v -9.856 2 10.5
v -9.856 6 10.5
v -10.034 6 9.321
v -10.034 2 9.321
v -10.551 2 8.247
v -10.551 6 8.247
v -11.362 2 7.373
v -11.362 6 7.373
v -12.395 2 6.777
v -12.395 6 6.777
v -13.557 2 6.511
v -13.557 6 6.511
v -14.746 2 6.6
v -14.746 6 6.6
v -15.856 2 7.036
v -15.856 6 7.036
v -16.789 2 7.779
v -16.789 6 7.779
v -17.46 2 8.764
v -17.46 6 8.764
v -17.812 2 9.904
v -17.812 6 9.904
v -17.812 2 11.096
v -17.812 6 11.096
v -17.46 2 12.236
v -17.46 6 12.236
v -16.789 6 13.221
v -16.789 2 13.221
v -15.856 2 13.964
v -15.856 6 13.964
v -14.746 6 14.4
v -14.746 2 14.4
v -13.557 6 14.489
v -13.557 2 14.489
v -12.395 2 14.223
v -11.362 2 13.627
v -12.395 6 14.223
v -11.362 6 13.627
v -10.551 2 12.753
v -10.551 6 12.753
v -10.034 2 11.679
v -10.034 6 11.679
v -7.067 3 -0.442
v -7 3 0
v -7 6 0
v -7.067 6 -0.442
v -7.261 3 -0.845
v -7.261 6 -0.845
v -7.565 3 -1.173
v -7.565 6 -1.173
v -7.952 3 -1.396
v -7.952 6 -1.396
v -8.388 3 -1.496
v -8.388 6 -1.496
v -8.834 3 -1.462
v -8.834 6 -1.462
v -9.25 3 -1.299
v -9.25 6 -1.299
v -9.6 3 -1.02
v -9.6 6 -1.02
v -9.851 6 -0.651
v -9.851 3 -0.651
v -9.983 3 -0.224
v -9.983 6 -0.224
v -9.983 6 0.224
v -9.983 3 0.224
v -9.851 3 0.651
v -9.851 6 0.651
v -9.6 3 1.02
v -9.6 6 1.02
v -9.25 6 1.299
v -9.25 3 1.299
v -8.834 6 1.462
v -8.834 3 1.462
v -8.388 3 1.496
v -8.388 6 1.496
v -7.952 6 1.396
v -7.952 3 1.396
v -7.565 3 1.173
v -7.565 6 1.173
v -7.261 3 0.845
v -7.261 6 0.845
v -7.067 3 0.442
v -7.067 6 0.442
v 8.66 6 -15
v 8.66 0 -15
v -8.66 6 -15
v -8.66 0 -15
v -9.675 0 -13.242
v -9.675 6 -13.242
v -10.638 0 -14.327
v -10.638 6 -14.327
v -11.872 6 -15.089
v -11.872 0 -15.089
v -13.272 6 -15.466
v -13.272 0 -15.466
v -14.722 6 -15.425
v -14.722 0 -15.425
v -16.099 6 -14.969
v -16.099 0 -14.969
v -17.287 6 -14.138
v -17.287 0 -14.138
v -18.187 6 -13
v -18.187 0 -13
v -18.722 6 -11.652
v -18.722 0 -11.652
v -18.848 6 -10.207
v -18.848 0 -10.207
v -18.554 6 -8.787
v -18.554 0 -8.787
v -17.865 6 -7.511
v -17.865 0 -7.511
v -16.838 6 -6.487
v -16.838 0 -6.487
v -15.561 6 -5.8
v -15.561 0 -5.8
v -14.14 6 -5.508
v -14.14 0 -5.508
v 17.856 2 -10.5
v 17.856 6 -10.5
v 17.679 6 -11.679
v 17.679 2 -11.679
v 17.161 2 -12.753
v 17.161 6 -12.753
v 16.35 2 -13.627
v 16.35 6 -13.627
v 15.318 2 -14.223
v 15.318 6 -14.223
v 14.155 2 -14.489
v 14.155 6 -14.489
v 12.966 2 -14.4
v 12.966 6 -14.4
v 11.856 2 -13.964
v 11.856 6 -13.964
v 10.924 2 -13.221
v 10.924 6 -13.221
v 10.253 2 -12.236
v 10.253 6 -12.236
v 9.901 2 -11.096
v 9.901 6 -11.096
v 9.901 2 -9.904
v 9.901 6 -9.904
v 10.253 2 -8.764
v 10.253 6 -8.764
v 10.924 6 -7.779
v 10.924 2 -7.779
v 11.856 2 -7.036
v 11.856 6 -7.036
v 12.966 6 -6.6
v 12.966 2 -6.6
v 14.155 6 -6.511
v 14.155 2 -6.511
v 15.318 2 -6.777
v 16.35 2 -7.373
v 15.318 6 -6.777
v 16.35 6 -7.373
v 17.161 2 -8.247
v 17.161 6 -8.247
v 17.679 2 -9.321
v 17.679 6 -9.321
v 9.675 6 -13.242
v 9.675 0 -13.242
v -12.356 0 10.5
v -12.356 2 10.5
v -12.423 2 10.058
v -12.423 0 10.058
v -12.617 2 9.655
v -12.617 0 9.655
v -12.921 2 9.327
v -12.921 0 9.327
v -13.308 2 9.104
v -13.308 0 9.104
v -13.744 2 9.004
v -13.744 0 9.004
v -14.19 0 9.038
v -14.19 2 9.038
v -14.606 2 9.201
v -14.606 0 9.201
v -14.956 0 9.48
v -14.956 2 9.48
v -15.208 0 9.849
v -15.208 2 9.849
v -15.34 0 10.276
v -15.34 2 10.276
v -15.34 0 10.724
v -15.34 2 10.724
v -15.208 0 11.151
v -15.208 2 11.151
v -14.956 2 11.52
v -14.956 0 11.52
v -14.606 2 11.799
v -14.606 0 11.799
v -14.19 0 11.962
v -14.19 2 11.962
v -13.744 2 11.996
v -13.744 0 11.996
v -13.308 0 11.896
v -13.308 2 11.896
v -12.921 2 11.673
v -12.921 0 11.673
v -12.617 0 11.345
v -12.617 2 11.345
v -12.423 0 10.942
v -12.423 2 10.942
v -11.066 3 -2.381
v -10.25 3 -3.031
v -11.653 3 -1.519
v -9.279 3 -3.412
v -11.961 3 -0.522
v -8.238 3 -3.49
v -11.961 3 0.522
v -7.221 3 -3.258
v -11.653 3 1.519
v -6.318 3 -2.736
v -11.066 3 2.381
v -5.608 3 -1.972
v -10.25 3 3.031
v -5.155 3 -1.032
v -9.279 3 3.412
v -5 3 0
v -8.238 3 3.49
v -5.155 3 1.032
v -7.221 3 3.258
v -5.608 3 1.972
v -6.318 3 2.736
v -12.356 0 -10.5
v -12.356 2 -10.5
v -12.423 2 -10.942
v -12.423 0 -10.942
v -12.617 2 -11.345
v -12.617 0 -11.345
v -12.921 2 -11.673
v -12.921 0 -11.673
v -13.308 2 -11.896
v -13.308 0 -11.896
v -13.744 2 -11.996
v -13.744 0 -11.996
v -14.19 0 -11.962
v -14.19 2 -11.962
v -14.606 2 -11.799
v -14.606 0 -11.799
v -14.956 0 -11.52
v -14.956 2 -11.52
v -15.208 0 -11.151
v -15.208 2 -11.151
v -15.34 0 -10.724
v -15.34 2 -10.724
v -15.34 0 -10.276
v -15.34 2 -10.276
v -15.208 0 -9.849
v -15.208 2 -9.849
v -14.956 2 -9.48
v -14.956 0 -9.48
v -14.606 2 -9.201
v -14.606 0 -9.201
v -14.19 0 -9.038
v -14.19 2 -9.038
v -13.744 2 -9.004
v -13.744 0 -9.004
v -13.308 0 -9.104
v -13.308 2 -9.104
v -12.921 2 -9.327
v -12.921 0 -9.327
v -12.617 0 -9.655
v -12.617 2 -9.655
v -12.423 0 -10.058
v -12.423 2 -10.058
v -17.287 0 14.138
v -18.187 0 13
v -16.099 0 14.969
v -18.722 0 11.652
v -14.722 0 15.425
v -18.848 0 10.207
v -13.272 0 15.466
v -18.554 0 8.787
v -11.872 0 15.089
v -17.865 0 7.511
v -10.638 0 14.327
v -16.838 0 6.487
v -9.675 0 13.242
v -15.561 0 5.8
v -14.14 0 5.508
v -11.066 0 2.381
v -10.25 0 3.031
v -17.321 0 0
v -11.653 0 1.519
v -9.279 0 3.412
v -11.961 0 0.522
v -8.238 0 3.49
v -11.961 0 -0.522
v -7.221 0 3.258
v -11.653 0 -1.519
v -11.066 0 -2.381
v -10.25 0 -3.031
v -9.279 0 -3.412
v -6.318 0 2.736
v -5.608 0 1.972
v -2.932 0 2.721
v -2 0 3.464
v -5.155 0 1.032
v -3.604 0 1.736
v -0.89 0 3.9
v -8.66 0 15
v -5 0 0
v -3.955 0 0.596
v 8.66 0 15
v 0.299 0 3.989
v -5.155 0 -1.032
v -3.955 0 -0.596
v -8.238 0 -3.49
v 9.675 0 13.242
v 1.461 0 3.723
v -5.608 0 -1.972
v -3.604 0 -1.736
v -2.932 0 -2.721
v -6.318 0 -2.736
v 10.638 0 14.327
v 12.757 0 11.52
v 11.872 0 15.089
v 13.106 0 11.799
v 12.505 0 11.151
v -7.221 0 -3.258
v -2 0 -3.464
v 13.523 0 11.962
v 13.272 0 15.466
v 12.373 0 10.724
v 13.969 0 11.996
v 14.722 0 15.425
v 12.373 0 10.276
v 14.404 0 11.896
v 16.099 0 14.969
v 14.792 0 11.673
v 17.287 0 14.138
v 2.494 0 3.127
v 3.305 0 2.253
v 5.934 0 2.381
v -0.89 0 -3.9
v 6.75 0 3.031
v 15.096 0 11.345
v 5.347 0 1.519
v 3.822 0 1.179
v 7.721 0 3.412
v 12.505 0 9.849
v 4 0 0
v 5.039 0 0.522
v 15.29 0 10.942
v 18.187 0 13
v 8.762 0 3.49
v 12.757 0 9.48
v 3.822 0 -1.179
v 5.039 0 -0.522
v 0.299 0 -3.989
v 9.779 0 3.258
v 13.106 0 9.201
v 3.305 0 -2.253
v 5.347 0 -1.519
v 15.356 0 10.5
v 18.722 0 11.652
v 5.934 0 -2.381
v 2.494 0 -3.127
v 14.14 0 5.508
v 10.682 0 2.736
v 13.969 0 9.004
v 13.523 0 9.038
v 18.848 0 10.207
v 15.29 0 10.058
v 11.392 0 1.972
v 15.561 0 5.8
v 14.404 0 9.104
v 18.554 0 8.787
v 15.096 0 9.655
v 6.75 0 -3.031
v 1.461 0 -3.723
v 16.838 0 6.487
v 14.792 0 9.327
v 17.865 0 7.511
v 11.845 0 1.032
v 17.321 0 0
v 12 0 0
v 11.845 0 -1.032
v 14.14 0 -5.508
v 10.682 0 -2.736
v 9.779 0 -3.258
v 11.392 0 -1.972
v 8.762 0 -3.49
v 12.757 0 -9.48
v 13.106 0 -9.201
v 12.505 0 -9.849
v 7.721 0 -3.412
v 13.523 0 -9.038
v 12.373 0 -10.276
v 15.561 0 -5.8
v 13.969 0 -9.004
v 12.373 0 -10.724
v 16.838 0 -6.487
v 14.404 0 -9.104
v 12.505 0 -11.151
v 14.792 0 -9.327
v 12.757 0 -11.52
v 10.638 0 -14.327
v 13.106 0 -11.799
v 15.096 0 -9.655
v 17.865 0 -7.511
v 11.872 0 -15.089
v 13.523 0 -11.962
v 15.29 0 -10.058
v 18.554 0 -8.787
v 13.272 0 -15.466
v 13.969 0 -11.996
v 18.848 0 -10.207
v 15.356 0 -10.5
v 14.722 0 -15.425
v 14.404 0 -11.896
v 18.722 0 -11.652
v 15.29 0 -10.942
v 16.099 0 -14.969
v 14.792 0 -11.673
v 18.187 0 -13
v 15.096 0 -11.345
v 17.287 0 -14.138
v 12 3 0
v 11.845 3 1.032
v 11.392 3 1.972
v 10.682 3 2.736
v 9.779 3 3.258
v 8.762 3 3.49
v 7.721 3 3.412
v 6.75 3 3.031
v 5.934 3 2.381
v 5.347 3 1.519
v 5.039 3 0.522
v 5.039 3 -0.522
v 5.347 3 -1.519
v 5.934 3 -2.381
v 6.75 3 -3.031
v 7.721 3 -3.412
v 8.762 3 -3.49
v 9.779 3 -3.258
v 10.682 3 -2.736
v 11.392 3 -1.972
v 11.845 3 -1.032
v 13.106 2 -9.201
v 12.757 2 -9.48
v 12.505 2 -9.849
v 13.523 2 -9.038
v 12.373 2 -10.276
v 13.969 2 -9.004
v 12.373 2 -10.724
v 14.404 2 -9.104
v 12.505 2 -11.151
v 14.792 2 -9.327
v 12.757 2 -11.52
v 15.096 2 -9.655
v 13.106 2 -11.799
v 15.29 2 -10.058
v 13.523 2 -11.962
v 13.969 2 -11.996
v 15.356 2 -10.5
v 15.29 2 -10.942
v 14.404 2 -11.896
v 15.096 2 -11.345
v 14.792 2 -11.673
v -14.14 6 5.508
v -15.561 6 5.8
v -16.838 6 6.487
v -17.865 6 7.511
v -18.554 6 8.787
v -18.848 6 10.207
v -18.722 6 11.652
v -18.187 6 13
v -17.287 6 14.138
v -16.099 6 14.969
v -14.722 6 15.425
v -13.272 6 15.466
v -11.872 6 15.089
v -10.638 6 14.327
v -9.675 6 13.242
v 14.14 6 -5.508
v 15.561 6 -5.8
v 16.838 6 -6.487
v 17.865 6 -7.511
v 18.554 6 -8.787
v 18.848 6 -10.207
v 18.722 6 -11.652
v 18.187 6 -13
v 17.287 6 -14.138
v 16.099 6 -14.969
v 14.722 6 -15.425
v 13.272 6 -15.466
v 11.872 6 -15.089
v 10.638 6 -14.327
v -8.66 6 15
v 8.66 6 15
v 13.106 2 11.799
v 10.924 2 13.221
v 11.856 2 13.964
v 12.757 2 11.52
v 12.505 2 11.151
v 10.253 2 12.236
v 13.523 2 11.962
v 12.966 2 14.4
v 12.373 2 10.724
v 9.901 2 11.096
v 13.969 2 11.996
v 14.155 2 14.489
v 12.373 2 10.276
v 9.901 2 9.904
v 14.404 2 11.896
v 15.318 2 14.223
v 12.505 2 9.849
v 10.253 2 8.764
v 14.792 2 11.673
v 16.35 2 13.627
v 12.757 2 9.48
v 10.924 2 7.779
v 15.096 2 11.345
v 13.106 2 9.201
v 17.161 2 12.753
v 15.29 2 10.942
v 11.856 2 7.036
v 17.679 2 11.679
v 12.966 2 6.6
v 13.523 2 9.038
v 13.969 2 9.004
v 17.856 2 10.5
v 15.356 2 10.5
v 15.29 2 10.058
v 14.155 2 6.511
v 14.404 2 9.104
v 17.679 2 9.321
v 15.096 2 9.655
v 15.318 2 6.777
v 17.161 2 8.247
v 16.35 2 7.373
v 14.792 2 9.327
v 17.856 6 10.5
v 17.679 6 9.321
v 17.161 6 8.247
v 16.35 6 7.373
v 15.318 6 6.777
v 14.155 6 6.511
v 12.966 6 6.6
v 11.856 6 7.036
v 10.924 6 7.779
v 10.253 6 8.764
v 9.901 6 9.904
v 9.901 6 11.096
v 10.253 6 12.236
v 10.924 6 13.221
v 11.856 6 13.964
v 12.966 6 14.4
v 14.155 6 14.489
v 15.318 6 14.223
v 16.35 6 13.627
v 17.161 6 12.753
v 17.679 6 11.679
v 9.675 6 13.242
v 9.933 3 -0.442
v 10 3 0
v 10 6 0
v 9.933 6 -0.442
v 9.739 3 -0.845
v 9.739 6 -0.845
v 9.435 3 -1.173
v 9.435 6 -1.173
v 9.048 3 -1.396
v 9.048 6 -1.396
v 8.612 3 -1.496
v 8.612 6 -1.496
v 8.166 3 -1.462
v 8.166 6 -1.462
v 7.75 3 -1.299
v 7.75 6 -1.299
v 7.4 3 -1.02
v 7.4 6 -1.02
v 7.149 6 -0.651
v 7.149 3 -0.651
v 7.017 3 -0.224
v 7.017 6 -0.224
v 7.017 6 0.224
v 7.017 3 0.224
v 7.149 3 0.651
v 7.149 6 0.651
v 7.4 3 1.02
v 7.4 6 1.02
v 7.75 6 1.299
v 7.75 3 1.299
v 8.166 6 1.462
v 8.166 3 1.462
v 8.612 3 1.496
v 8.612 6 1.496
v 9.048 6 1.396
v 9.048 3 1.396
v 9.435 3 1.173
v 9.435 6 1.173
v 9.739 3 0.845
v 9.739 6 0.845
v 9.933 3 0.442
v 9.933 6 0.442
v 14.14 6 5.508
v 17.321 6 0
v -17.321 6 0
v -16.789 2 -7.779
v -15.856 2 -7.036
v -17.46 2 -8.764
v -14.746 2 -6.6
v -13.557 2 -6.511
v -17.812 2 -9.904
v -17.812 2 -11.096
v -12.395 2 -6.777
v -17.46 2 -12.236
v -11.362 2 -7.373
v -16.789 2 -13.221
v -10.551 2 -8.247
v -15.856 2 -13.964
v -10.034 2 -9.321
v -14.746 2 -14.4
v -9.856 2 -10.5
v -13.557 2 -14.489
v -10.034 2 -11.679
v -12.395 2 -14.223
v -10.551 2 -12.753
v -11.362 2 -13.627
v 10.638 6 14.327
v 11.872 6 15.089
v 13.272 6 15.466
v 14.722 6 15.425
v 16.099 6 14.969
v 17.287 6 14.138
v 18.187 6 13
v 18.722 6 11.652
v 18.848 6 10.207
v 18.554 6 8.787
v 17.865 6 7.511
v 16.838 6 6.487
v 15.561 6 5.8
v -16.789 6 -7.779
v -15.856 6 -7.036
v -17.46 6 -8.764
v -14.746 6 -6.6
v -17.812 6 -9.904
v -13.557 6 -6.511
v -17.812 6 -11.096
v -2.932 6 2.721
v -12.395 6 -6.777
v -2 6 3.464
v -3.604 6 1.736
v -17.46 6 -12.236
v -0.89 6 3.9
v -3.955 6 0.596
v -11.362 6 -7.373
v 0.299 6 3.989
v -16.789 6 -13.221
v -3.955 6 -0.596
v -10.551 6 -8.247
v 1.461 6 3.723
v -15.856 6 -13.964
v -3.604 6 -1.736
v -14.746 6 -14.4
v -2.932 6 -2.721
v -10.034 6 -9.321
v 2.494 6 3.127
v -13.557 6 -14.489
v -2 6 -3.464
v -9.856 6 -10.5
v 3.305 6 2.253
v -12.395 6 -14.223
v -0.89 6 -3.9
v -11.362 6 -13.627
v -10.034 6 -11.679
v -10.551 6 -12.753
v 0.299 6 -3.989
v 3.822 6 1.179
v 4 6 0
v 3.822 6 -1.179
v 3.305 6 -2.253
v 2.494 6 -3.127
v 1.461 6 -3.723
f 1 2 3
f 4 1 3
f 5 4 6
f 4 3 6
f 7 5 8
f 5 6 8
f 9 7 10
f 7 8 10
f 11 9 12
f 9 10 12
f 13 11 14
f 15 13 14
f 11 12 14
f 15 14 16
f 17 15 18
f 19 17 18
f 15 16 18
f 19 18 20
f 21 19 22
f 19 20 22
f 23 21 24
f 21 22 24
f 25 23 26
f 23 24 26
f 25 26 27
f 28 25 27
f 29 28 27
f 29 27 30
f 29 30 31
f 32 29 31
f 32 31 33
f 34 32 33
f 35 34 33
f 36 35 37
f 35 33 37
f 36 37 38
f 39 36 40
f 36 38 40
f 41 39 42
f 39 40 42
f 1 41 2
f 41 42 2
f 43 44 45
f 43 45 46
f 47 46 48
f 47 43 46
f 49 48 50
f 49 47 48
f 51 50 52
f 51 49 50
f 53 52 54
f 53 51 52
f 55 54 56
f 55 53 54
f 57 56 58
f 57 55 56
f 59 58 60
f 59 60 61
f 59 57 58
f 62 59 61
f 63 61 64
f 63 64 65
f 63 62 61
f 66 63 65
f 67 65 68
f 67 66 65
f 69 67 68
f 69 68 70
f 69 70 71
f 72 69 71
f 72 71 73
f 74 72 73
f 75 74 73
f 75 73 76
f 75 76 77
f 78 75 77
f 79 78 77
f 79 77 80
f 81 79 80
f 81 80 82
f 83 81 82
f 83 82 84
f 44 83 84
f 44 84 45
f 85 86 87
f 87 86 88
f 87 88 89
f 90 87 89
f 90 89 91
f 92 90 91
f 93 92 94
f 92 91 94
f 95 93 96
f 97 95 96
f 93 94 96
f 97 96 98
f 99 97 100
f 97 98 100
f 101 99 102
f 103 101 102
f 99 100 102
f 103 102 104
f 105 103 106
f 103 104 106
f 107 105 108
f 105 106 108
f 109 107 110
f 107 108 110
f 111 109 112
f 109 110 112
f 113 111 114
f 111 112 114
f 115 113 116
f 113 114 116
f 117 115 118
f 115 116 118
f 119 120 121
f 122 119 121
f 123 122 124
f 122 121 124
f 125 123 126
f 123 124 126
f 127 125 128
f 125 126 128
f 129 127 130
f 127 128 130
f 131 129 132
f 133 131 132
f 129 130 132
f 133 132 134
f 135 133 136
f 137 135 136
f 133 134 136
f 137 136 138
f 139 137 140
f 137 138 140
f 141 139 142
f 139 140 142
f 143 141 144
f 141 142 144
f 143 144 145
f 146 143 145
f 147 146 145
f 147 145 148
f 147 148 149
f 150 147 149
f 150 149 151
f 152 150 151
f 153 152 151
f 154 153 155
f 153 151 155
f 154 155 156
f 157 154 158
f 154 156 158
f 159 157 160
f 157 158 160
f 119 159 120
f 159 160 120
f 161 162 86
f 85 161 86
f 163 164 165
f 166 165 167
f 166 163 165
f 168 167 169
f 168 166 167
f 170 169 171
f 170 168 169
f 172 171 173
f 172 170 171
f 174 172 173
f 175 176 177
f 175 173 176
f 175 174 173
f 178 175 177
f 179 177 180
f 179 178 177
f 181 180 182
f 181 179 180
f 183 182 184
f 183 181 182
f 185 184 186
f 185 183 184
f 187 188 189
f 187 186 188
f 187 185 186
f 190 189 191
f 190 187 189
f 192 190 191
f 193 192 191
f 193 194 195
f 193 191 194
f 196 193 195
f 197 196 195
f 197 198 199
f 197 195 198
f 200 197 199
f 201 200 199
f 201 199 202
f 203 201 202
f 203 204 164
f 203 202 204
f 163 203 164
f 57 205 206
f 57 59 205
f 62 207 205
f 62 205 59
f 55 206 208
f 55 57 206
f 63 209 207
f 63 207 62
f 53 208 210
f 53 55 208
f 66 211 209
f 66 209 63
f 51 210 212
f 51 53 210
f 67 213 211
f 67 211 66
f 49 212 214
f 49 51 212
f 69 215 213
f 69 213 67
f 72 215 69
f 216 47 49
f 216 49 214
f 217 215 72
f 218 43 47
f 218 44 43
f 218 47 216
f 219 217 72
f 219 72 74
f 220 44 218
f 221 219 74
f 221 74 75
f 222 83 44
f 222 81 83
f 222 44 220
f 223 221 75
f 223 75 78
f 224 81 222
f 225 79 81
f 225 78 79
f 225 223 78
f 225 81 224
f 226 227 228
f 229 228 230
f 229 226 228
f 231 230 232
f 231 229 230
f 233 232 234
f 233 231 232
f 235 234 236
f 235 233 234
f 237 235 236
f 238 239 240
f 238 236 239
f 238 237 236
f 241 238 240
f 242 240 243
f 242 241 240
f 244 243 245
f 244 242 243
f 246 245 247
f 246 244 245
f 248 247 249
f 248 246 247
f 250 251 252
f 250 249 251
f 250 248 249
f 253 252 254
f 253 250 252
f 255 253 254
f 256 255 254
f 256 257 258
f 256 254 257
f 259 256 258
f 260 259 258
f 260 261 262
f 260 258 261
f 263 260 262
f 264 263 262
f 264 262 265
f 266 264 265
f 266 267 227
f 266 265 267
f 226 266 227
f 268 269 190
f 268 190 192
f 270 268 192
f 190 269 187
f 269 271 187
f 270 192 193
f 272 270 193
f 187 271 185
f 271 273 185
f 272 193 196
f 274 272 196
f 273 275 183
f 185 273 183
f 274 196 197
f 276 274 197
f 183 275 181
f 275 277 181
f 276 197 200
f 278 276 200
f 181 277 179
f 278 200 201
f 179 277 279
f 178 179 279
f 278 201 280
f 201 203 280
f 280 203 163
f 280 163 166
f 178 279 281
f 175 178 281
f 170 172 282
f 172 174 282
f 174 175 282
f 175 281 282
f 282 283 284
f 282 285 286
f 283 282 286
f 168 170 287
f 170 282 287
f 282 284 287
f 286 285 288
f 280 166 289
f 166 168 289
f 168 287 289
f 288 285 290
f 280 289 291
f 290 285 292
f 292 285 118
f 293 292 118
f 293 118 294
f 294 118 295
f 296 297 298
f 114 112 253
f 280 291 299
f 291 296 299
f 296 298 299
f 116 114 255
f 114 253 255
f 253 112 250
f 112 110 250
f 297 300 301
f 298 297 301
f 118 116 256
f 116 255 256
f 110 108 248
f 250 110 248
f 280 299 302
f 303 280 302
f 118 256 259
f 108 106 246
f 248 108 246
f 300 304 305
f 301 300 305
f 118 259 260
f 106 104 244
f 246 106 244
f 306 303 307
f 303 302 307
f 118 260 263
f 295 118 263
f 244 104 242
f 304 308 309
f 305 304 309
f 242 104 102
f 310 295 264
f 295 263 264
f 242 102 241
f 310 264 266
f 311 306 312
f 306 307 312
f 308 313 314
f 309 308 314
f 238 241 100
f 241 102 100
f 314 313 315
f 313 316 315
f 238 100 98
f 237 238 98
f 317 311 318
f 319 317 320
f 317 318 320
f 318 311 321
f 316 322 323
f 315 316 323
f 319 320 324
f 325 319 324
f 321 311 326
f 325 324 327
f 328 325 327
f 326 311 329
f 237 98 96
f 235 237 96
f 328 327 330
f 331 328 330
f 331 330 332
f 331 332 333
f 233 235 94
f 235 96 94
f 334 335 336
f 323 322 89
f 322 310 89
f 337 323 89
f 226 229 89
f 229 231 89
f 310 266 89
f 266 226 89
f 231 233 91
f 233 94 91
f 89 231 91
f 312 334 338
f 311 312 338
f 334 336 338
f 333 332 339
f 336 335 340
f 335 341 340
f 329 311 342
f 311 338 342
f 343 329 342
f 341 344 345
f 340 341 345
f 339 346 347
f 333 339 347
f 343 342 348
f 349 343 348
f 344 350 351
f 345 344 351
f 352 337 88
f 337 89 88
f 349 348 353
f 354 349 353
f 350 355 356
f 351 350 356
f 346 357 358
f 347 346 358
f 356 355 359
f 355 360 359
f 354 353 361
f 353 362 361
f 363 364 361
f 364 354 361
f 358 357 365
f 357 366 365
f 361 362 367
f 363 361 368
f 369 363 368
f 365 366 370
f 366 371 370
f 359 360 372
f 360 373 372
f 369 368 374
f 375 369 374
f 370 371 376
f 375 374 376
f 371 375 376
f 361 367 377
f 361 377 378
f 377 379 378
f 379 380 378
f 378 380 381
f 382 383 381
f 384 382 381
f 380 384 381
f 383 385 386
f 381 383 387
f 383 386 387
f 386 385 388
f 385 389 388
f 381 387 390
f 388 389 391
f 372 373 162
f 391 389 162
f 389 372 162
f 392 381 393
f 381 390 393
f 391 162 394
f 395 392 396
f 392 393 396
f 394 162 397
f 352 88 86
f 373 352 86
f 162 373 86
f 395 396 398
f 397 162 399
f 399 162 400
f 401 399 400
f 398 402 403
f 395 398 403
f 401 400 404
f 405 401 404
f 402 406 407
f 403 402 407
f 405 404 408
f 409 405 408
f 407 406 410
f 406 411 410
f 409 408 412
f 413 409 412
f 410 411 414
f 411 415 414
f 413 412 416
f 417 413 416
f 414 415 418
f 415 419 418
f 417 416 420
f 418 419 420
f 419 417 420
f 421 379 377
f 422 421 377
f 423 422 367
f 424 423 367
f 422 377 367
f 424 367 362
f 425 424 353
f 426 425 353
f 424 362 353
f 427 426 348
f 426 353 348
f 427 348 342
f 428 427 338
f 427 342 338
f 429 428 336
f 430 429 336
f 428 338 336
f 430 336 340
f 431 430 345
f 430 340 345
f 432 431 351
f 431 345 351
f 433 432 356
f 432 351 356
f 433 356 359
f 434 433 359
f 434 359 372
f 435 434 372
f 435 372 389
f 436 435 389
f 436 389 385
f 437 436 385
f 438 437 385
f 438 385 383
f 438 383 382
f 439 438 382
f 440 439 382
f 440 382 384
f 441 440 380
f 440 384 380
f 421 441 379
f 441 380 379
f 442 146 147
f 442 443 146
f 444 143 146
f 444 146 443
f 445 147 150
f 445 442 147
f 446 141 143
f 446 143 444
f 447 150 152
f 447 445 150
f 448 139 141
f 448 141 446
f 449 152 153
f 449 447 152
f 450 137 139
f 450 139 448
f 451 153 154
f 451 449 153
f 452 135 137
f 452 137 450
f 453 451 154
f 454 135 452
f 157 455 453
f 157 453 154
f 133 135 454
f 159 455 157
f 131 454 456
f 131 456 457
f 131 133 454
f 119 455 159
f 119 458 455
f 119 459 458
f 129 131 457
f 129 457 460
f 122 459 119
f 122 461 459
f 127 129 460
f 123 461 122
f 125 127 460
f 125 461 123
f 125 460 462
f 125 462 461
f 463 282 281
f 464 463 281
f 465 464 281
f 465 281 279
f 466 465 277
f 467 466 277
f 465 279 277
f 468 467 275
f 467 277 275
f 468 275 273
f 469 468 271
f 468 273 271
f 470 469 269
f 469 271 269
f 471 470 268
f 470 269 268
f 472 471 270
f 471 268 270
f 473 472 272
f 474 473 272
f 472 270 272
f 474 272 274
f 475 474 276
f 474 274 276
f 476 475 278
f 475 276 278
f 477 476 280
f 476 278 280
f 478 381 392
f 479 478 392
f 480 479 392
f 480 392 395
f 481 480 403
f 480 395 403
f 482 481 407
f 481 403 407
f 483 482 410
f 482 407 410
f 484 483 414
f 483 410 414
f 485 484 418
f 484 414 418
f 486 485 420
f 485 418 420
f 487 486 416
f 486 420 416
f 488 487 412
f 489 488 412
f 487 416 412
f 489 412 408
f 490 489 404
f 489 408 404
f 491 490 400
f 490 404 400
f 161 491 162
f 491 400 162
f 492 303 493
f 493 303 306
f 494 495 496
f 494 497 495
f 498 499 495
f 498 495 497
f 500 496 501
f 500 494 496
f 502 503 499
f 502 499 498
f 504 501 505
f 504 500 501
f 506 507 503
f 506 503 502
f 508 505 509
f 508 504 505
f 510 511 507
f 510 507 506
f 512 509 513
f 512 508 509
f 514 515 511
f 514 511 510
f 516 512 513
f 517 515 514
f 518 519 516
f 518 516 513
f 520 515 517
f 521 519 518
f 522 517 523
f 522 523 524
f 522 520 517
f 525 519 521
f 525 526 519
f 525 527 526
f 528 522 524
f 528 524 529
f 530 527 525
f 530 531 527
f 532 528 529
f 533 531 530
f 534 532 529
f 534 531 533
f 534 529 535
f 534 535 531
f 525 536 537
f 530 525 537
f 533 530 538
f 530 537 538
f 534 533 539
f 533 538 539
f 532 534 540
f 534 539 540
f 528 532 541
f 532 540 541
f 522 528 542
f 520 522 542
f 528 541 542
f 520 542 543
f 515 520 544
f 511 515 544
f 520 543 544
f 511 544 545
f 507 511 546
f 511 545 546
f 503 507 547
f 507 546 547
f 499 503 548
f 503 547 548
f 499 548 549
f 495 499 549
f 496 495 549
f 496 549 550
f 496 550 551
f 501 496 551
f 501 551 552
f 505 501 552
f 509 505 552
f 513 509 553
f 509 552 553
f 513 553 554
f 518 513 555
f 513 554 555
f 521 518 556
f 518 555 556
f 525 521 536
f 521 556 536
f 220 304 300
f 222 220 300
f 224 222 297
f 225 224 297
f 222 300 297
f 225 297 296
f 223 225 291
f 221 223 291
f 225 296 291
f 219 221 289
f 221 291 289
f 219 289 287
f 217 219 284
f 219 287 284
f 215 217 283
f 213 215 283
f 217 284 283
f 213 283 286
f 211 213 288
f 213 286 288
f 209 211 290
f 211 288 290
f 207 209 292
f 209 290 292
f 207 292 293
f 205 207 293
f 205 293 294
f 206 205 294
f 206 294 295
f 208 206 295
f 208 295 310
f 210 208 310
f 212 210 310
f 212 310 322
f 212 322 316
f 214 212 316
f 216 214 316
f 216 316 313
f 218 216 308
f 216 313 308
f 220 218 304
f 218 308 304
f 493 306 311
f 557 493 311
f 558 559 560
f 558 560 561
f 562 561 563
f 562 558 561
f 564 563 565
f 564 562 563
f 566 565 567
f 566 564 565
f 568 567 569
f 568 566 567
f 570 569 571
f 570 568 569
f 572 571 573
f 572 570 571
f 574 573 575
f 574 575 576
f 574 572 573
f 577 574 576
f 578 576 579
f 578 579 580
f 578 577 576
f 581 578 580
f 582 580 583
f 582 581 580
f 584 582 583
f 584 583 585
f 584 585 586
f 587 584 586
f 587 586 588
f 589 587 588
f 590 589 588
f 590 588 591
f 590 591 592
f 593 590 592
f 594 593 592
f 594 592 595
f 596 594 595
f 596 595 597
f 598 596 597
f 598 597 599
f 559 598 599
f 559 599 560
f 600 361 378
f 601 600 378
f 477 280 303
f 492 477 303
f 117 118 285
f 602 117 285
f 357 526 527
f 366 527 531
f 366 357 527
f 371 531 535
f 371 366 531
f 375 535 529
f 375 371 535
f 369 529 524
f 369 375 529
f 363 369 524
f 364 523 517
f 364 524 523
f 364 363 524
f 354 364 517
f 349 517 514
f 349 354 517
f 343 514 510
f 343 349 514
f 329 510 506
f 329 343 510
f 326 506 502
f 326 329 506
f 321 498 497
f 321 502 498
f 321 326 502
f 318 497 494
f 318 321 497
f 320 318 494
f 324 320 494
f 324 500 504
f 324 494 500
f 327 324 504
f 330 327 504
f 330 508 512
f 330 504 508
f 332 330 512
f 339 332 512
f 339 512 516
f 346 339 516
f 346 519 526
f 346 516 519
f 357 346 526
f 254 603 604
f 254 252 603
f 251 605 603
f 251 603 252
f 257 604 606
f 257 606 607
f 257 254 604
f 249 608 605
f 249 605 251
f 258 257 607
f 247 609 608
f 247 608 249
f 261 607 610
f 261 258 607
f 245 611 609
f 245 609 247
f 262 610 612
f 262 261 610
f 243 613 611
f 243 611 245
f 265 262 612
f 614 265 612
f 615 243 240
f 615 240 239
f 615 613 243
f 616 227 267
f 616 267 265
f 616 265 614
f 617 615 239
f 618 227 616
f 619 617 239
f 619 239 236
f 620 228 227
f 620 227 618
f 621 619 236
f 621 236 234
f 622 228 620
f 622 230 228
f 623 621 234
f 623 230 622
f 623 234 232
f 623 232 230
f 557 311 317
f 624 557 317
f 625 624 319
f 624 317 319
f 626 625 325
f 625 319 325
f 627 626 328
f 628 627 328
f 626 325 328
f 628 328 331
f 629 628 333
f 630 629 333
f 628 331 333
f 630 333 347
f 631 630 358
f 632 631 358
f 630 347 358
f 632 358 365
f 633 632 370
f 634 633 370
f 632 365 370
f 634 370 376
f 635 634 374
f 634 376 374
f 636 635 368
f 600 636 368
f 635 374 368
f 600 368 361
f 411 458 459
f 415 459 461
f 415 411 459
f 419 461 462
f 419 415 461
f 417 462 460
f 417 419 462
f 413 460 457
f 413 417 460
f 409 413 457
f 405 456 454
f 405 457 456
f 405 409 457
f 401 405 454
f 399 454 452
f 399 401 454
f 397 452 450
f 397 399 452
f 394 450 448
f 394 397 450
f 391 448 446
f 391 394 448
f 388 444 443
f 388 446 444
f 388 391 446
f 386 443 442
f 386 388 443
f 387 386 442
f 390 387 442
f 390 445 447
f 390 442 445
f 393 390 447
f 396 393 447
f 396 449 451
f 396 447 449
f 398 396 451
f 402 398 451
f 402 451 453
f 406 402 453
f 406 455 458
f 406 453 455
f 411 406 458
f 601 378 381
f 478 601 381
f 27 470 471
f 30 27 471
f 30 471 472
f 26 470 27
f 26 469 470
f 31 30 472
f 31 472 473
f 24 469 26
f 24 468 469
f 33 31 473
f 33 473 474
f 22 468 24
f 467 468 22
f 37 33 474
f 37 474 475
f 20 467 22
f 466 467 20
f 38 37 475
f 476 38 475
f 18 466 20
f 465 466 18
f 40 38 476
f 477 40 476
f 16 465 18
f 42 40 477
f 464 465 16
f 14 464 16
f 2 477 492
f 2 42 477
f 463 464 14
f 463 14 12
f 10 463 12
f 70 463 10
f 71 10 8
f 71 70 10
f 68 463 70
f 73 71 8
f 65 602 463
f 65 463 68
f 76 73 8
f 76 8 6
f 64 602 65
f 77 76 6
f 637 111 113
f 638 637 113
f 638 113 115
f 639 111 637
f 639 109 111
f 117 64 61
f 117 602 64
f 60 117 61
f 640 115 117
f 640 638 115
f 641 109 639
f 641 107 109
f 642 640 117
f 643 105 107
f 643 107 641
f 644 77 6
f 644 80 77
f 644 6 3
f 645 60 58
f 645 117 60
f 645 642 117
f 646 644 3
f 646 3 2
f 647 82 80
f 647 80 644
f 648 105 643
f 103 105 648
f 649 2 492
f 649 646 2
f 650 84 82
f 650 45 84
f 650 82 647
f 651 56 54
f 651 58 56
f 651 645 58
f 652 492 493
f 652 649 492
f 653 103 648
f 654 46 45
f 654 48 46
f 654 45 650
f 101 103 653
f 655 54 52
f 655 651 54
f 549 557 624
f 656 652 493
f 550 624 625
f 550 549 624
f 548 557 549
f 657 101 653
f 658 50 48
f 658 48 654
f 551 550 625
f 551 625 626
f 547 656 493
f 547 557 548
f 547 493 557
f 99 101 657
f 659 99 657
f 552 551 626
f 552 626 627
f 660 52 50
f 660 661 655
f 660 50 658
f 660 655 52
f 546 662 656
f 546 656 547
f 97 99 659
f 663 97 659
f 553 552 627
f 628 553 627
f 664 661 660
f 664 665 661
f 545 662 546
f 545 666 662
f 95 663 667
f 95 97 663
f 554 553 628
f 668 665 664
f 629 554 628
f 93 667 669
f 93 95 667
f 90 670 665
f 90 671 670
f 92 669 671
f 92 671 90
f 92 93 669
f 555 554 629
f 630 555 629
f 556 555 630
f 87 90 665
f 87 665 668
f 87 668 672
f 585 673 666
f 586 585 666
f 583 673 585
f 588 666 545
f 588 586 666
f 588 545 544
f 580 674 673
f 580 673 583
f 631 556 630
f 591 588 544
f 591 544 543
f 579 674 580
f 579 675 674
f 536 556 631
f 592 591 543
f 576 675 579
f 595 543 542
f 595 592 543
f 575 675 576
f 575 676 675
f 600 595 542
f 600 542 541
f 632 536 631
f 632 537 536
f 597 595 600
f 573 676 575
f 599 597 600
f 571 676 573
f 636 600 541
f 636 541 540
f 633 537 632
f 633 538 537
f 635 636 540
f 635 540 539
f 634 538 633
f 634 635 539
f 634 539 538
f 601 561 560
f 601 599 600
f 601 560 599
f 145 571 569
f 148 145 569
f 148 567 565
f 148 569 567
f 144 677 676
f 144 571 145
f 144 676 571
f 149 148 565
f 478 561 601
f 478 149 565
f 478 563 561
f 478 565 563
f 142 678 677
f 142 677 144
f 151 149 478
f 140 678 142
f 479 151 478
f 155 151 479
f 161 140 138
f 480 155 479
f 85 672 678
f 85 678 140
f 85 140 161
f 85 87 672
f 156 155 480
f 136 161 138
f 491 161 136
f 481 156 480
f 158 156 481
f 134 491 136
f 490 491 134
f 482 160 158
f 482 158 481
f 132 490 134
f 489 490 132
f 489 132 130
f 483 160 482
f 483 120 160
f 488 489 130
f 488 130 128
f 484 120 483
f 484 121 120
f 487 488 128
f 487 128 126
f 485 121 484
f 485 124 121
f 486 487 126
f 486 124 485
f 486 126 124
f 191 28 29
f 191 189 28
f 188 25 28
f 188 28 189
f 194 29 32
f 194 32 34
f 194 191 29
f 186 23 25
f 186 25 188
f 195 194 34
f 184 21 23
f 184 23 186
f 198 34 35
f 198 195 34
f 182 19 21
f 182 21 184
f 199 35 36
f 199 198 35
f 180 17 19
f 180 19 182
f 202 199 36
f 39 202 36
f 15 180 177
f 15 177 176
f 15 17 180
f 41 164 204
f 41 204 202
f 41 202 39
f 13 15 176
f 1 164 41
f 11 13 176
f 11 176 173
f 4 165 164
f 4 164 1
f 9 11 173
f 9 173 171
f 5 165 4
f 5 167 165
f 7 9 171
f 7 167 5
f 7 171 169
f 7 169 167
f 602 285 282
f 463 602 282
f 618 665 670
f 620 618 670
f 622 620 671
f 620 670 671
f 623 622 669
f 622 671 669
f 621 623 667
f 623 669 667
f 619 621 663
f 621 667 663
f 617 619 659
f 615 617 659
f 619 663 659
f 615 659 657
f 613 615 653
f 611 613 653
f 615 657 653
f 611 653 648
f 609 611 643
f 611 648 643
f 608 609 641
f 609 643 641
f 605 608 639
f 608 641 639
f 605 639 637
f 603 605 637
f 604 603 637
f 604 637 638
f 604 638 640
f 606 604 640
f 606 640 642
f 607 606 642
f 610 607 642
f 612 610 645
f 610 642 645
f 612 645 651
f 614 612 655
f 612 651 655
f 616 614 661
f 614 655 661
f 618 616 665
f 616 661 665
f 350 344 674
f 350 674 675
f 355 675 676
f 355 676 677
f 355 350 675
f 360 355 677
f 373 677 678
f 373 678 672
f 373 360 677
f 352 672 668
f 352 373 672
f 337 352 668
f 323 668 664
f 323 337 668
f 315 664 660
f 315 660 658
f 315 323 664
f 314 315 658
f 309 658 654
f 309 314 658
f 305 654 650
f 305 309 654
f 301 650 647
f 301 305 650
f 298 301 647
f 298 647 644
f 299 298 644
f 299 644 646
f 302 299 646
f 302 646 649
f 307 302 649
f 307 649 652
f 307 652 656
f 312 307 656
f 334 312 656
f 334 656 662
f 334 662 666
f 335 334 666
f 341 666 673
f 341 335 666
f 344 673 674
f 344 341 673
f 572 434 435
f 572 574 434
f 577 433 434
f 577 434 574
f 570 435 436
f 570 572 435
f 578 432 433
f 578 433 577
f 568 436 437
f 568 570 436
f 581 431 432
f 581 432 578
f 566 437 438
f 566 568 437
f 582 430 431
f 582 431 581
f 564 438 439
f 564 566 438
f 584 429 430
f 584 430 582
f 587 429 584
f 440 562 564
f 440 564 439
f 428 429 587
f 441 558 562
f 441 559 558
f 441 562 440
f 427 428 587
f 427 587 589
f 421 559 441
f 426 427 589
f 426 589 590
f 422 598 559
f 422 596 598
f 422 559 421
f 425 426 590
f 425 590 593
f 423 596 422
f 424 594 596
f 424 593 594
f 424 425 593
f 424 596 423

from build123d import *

# Parameters (mm, degrees)
SKETCH2_R           = 5
SKETCH2_R_2         = 1.5
SKETCH2_R_3         = 4
BOSS_EXTRUDE1_DEPTH = 6
SKETCH3_R           = 3.5
CUT_EXTRUDE3_DEPTH  = 3
SKETCH4_R           = 4
CUT_EXTRUDE4_DEPTH  = 4


with BuildPart() as part:
    # Sketch2 → Boss-Extrude1 (new body)
    with BuildSketch(Plane(origin=(0, 0, 0), x_dir=(1, 0, 0), z_dir=(0, 1, 0))):
        with Locations((-13.856406461, 10.5)):
            Circle(SKETCH2_R)
        with Locations((-13.856406461, 10.5)):
            Circle(SKETCH2_R_2, mode=Mode.SUBTRACT)
        with Locations((13.856406461, 10.5)):
            Circle(SKETCH2_R)
        with Locations((13.856406461, 10.5)):
            Circle(SKETCH2_R_2, mode=Mode.SUBTRACT)
        with Locations((13.856406461, -10.5)):
            Circle(SKETCH2_R)
        with Locations((13.856406461, -10.5)):
            Circle(SKETCH2_R_2, mode=Mode.SUBTRACT)
        with Locations((-13.856406461, -10.5)):
            Circle(SKETCH2_R)
        with Locations((-13.856406461, -10.5)):
            Circle(SKETCH2_R_2, mode=Mode.SUBTRACT)
        Polygon((17.320508076, 0), (8.660254038, 15), (-8.660254038, 15), (-17.320508076, 0), (-8.660254038, -15), (8.660254038, -15), align=None)
        Circle(SKETCH2_R_3, mode=Mode.SUBTRACT)
        with Locations((8.5, 0)):
            Circle(SKETCH2_R_2, mode=Mode.SUBTRACT)
        with Locations((-8.5, 0)):
            Circle(SKETCH2_R_2, mode=Mode.SUBTRACT)
    extrude(amount=BOSS_EXTRUDE1_DEPTH)

    # Sketch3 → Cut-Extrude3 (cut)
    with BuildSketch(Plane.XZ):
        with Locations((-8.5, 0)):
            Circle(SKETCH3_R)
        with Locations((8.5, 0)):
            Circle(SKETCH3_R)
    extrude(amount=-CUT_EXTRUDE3_DEPTH, mode=Mode.SUBTRACT)

    # Sketch4 → Cut-Extrude4 (cut)
    with BuildSketch(Plane(origin=(0, 6, 0), x_dir=(1, 0, 0), z_dir=(0, 1, 0))):
        with Locations((-13.856406461, 10.5)):
            Circle(SKETCH4_R)
        with Locations((13.856406461, 10.5)):
            Circle(SKETCH4_R)
        with Locations((-13.856406461, -10.5)):
            Circle(SKETCH4_R)
        with Locations((13.856406461, -10.5)):
            Circle(SKETCH4_R)
    extrude(amount=-CUT_EXTRUDE4_DEPTH, mode=Mode.SUBTRACT)


solid = part.part
